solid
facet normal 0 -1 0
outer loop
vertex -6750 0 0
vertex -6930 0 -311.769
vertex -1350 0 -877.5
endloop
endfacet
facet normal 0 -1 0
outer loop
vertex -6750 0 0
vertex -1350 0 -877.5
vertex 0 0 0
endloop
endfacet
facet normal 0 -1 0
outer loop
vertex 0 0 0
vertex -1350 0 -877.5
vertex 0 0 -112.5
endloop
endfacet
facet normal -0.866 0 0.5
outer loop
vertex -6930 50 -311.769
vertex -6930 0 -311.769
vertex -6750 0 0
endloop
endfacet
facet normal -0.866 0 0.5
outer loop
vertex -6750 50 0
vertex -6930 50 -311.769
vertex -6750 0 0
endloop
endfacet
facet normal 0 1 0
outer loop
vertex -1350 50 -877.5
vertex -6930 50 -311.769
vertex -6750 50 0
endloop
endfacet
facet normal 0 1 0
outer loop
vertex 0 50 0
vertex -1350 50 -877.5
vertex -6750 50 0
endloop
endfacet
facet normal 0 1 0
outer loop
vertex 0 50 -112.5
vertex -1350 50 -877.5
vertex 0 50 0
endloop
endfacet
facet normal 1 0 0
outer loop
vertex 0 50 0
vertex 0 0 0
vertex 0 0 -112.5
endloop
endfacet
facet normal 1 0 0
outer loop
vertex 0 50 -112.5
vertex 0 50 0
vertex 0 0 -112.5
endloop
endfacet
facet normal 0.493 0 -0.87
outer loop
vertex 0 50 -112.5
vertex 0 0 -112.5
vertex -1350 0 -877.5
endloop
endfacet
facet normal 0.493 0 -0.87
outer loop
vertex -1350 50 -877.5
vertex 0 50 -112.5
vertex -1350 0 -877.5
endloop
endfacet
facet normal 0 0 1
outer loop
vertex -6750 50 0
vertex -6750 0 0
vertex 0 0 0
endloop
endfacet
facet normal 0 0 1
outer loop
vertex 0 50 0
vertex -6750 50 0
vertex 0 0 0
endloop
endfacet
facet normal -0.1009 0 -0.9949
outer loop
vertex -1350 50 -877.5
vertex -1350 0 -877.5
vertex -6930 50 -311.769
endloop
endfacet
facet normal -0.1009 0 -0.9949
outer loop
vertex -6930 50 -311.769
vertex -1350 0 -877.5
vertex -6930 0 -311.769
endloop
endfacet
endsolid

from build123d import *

# Parameters (mm, degrees)
BOSS_EXTRUDE1_DEPTH = 50


with BuildPart() as part:
    # Sketch1 → Boss-Extrude1 (new body)
    with BuildSketch(Plane(origin=(0, 0, 0), x_dir=(1, 0, 0), z_dir=(0, 1, 0))):
        Polygon((-1350, 0), (0, 0), (0, 112.5), (-1350, 877.5), align=None)
        Polygon((-6750, 0), (-1350, 0), (-1350, 877.5), (-6930, 311.769145362), align=None)
    extrude(amount=BOSS_EXTRUDE1_DEPTH)


solid = part.part
